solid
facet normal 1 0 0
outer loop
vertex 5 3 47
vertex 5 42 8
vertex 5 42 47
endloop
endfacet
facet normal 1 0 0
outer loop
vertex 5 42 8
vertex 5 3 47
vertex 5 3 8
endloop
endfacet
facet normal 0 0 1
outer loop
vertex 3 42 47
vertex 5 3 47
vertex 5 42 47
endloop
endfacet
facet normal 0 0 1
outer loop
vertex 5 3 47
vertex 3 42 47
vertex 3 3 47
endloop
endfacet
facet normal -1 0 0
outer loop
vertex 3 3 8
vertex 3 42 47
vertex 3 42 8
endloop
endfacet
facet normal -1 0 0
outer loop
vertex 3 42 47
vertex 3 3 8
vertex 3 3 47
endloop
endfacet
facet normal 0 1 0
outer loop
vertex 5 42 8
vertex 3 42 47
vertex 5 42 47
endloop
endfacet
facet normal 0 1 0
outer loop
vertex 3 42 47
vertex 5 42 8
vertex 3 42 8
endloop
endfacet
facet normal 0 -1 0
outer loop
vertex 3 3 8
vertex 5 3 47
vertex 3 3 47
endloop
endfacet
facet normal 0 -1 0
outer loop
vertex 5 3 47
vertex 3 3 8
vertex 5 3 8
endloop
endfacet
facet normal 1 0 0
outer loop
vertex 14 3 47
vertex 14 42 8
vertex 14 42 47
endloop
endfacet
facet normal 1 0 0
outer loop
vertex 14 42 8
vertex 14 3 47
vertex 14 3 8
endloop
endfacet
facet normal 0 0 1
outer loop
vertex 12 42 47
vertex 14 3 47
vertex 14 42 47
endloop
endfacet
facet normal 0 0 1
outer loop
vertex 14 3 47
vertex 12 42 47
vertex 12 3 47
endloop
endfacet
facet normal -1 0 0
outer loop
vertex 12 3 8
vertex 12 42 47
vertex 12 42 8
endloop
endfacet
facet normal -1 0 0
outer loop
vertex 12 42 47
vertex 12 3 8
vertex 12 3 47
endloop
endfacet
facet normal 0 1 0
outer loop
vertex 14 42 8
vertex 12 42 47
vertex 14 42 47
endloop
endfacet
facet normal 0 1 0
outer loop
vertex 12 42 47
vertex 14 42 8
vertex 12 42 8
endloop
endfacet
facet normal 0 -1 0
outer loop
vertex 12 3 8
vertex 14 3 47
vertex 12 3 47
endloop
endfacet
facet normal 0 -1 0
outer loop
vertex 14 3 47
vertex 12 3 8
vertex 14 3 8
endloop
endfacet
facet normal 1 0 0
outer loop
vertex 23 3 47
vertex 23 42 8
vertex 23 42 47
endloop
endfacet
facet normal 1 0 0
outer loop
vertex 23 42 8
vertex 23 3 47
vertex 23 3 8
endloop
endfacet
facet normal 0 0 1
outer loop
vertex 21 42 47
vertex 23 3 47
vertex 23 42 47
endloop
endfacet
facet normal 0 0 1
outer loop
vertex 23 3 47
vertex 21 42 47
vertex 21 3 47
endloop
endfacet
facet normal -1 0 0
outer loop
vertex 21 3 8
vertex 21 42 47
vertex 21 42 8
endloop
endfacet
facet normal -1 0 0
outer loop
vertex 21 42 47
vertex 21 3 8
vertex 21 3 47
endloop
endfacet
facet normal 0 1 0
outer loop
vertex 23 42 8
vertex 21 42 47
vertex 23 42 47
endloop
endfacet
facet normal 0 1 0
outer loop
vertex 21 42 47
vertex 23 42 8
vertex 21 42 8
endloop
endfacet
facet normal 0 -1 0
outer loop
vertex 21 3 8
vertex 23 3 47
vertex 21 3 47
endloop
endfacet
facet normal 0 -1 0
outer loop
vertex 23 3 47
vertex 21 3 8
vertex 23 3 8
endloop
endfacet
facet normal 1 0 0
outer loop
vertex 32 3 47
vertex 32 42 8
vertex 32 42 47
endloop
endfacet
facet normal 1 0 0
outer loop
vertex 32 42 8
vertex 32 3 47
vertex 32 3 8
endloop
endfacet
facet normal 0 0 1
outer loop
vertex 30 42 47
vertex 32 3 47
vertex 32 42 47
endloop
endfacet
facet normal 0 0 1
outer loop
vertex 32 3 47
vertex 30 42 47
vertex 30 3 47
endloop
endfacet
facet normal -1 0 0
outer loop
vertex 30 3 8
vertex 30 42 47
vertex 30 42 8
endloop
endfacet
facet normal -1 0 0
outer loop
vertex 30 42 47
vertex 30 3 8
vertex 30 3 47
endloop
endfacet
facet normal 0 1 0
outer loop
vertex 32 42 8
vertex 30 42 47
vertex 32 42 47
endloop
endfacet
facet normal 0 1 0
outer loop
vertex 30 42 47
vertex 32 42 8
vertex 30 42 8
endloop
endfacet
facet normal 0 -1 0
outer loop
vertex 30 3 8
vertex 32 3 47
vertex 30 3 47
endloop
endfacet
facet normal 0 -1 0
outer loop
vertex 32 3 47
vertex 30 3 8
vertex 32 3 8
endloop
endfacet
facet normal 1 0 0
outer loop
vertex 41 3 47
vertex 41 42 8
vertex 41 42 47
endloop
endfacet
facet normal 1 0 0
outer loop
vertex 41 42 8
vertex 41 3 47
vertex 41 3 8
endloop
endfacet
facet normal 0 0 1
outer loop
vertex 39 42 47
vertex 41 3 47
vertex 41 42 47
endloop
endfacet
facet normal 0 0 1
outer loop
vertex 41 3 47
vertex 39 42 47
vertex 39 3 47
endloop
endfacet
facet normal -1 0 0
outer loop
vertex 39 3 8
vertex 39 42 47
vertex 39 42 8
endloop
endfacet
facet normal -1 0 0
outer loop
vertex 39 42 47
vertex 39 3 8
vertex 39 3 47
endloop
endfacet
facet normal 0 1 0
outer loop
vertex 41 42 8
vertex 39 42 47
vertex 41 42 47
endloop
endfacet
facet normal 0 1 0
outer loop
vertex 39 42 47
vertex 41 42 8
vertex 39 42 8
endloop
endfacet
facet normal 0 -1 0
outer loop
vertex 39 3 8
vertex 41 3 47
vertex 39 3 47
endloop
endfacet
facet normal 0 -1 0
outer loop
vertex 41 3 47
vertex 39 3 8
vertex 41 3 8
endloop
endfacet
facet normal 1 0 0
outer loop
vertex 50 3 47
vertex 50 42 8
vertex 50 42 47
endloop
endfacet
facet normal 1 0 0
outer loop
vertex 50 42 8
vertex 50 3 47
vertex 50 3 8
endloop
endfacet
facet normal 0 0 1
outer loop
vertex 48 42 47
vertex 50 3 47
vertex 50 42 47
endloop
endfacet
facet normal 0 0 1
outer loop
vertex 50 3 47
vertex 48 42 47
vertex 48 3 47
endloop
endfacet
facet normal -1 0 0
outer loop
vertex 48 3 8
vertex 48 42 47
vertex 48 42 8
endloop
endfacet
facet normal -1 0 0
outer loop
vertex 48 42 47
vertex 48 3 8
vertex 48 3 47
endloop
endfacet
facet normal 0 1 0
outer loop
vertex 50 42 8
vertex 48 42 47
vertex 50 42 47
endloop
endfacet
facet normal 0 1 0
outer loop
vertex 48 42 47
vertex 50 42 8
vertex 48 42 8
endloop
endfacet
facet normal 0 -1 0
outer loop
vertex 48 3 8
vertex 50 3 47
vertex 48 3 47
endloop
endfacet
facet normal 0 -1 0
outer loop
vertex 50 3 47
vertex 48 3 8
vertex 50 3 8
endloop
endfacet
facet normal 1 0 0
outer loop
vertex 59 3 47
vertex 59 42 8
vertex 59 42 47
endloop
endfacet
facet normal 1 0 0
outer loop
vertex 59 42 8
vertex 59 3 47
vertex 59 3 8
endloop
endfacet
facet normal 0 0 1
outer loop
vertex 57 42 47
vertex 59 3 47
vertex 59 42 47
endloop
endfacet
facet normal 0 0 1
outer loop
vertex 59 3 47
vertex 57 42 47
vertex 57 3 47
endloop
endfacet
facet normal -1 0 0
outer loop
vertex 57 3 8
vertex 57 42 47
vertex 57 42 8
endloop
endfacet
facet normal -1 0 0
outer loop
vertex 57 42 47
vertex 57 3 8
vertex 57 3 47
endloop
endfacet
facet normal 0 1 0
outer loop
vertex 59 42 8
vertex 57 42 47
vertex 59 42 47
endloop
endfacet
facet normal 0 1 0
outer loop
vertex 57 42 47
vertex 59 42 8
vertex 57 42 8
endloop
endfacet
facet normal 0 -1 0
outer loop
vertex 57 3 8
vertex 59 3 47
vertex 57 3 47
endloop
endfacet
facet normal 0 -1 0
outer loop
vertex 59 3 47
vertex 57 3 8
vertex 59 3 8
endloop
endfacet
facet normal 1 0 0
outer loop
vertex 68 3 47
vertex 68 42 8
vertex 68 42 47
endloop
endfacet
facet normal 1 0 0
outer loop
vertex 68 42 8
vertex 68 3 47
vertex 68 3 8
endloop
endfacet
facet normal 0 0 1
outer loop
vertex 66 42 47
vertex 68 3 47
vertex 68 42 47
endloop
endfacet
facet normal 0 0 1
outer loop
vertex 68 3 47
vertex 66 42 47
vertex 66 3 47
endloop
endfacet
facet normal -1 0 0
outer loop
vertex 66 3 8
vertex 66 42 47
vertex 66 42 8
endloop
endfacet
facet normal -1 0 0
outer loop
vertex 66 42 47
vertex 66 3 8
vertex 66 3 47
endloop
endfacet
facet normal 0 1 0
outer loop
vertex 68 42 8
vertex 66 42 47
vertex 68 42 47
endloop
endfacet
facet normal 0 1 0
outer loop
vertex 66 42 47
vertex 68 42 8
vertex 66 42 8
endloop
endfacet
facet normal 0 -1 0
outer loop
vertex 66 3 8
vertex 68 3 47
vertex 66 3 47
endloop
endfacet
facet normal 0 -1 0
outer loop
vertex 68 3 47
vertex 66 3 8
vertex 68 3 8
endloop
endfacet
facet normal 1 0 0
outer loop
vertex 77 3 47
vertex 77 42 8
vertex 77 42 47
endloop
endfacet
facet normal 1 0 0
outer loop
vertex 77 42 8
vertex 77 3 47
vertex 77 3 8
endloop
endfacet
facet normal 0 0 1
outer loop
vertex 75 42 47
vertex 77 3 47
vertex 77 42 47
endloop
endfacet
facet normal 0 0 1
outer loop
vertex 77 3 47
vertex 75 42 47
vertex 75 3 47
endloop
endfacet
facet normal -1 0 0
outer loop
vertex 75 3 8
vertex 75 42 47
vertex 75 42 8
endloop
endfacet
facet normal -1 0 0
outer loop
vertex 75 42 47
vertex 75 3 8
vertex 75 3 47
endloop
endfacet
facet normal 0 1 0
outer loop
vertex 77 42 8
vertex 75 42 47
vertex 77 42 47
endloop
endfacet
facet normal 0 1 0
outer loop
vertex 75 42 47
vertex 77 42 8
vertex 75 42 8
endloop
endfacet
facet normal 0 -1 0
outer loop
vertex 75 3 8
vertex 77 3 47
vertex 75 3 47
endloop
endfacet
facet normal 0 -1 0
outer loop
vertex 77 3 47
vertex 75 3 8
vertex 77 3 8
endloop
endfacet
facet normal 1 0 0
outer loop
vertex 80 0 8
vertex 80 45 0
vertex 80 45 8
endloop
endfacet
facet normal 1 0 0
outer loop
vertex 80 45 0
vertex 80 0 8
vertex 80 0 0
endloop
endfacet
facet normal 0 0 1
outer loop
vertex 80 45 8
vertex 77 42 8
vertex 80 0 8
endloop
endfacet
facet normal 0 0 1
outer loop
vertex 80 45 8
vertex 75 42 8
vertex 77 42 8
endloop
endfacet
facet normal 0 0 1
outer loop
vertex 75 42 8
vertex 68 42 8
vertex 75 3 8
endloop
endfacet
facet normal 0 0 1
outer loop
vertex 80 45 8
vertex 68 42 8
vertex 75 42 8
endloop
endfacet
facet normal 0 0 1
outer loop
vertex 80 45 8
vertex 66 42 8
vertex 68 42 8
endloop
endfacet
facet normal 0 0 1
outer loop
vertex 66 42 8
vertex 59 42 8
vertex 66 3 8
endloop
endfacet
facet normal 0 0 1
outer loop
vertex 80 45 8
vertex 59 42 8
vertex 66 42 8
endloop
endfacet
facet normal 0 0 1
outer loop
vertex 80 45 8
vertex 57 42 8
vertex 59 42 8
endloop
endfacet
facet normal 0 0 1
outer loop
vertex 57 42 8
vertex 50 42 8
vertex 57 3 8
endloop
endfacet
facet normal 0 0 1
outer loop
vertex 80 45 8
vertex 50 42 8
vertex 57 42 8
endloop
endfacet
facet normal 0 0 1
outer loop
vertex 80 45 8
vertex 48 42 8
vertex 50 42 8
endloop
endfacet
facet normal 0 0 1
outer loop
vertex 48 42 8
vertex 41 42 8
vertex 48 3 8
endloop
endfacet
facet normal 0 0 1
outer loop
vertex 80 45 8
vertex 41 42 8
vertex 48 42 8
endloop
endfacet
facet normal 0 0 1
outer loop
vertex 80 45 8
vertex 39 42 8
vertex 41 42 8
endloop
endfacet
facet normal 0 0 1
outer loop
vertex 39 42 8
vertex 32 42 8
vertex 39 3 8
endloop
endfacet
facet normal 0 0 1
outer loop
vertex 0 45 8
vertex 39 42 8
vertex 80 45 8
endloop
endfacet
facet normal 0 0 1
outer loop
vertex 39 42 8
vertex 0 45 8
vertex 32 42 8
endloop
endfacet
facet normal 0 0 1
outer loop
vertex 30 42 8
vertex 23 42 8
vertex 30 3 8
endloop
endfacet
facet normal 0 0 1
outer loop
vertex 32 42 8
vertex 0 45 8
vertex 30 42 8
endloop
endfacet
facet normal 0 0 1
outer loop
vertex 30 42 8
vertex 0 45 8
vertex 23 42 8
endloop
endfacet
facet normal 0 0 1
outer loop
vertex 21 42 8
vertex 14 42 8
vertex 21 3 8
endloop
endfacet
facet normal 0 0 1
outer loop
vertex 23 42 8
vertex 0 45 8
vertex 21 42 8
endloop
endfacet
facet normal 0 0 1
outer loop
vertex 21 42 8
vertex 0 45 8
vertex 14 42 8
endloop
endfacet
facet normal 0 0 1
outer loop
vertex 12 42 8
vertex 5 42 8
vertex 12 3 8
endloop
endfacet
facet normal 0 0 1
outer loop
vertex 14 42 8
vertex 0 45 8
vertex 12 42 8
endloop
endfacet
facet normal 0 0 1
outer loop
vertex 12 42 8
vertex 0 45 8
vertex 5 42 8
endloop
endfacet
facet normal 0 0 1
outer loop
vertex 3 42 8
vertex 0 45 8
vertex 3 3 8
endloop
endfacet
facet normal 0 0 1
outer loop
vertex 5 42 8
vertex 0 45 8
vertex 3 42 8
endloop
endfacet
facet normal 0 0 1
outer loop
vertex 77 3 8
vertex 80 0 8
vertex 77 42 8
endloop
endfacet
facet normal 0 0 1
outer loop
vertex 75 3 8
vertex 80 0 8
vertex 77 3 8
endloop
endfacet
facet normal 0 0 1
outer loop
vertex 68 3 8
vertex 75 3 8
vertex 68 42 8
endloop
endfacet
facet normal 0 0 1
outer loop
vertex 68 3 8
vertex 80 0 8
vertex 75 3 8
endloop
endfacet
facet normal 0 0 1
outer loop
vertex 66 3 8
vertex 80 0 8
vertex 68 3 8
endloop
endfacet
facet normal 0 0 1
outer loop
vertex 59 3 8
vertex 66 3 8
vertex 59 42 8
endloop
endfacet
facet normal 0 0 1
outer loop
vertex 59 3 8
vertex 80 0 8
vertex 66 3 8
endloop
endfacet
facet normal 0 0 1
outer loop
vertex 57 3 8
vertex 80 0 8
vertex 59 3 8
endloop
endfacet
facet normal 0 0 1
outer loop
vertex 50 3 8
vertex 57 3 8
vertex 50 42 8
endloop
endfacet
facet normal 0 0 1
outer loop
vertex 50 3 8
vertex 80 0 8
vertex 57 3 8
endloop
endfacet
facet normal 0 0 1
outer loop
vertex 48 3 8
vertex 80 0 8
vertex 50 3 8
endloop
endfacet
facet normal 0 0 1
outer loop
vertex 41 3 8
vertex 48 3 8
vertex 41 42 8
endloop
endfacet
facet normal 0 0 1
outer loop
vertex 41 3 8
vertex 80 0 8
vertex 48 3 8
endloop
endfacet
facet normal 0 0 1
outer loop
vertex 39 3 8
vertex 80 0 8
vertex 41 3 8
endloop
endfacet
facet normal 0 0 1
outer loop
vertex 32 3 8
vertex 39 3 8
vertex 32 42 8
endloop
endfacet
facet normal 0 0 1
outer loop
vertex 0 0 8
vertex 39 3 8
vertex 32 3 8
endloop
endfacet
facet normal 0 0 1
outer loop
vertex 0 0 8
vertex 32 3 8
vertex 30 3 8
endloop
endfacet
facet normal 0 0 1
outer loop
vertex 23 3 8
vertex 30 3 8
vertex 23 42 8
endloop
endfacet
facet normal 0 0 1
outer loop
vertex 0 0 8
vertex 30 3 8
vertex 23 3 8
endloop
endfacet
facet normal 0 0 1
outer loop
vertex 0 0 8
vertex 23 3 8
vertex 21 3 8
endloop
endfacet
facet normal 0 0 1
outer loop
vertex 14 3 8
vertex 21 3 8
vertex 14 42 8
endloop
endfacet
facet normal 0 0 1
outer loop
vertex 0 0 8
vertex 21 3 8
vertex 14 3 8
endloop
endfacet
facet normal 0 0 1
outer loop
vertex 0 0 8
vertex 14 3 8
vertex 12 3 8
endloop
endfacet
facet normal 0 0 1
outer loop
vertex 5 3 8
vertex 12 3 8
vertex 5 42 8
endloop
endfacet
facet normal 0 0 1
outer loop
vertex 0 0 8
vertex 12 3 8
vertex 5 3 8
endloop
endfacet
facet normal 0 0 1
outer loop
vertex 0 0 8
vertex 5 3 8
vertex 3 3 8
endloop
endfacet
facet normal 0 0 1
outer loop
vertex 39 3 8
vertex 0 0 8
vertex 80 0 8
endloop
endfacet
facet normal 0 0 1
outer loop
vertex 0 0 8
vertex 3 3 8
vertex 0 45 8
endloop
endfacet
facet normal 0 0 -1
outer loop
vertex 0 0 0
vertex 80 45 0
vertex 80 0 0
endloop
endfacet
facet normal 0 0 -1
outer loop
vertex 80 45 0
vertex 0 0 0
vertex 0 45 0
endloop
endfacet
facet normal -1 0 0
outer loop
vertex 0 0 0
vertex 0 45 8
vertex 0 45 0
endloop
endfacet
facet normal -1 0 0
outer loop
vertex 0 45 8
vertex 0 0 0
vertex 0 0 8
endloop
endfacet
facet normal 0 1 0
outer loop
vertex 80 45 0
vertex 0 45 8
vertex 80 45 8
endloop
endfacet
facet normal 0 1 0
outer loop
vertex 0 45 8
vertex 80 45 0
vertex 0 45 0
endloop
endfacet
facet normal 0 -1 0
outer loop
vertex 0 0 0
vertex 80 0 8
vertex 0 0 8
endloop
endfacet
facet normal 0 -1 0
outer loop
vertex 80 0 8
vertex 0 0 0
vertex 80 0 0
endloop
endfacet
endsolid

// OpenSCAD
$fn = 32;

// ----------------------------------------------------------------------
// Heatsink: uniform fin block
// ----------------------------------------------------------------------

// --- parameters (mm) ---
base_l = 80;              // base length, X
base_w = 45;              // base width, Y
base_t = 8;               // base plate thickness
fin_h = 40;               // fin height above the base
fin_t = 2;                // fin thickness
edge = 3;                 // margin from the base ends
pitch = 9;                // fin pitch
fit_tol = 0.1;            // tolerance for press fits, mm
free_tol = 0.5;           // tolerance for clearance fits, mm

n_fins = floor((base_l - 2 * edge - fin_t) / pitch) + 1;  // fin count
total_h = base_t + fin_h - 1;  // overall height

union() {
  cube([base_l, base_w, base_t]);
  for (i = [0 : n_fins - 1])
    translate([edge + i * pitch, edge, base_t - 1])
      cube([fin_t, base_w - 2 * edge, fin_h]);
}
